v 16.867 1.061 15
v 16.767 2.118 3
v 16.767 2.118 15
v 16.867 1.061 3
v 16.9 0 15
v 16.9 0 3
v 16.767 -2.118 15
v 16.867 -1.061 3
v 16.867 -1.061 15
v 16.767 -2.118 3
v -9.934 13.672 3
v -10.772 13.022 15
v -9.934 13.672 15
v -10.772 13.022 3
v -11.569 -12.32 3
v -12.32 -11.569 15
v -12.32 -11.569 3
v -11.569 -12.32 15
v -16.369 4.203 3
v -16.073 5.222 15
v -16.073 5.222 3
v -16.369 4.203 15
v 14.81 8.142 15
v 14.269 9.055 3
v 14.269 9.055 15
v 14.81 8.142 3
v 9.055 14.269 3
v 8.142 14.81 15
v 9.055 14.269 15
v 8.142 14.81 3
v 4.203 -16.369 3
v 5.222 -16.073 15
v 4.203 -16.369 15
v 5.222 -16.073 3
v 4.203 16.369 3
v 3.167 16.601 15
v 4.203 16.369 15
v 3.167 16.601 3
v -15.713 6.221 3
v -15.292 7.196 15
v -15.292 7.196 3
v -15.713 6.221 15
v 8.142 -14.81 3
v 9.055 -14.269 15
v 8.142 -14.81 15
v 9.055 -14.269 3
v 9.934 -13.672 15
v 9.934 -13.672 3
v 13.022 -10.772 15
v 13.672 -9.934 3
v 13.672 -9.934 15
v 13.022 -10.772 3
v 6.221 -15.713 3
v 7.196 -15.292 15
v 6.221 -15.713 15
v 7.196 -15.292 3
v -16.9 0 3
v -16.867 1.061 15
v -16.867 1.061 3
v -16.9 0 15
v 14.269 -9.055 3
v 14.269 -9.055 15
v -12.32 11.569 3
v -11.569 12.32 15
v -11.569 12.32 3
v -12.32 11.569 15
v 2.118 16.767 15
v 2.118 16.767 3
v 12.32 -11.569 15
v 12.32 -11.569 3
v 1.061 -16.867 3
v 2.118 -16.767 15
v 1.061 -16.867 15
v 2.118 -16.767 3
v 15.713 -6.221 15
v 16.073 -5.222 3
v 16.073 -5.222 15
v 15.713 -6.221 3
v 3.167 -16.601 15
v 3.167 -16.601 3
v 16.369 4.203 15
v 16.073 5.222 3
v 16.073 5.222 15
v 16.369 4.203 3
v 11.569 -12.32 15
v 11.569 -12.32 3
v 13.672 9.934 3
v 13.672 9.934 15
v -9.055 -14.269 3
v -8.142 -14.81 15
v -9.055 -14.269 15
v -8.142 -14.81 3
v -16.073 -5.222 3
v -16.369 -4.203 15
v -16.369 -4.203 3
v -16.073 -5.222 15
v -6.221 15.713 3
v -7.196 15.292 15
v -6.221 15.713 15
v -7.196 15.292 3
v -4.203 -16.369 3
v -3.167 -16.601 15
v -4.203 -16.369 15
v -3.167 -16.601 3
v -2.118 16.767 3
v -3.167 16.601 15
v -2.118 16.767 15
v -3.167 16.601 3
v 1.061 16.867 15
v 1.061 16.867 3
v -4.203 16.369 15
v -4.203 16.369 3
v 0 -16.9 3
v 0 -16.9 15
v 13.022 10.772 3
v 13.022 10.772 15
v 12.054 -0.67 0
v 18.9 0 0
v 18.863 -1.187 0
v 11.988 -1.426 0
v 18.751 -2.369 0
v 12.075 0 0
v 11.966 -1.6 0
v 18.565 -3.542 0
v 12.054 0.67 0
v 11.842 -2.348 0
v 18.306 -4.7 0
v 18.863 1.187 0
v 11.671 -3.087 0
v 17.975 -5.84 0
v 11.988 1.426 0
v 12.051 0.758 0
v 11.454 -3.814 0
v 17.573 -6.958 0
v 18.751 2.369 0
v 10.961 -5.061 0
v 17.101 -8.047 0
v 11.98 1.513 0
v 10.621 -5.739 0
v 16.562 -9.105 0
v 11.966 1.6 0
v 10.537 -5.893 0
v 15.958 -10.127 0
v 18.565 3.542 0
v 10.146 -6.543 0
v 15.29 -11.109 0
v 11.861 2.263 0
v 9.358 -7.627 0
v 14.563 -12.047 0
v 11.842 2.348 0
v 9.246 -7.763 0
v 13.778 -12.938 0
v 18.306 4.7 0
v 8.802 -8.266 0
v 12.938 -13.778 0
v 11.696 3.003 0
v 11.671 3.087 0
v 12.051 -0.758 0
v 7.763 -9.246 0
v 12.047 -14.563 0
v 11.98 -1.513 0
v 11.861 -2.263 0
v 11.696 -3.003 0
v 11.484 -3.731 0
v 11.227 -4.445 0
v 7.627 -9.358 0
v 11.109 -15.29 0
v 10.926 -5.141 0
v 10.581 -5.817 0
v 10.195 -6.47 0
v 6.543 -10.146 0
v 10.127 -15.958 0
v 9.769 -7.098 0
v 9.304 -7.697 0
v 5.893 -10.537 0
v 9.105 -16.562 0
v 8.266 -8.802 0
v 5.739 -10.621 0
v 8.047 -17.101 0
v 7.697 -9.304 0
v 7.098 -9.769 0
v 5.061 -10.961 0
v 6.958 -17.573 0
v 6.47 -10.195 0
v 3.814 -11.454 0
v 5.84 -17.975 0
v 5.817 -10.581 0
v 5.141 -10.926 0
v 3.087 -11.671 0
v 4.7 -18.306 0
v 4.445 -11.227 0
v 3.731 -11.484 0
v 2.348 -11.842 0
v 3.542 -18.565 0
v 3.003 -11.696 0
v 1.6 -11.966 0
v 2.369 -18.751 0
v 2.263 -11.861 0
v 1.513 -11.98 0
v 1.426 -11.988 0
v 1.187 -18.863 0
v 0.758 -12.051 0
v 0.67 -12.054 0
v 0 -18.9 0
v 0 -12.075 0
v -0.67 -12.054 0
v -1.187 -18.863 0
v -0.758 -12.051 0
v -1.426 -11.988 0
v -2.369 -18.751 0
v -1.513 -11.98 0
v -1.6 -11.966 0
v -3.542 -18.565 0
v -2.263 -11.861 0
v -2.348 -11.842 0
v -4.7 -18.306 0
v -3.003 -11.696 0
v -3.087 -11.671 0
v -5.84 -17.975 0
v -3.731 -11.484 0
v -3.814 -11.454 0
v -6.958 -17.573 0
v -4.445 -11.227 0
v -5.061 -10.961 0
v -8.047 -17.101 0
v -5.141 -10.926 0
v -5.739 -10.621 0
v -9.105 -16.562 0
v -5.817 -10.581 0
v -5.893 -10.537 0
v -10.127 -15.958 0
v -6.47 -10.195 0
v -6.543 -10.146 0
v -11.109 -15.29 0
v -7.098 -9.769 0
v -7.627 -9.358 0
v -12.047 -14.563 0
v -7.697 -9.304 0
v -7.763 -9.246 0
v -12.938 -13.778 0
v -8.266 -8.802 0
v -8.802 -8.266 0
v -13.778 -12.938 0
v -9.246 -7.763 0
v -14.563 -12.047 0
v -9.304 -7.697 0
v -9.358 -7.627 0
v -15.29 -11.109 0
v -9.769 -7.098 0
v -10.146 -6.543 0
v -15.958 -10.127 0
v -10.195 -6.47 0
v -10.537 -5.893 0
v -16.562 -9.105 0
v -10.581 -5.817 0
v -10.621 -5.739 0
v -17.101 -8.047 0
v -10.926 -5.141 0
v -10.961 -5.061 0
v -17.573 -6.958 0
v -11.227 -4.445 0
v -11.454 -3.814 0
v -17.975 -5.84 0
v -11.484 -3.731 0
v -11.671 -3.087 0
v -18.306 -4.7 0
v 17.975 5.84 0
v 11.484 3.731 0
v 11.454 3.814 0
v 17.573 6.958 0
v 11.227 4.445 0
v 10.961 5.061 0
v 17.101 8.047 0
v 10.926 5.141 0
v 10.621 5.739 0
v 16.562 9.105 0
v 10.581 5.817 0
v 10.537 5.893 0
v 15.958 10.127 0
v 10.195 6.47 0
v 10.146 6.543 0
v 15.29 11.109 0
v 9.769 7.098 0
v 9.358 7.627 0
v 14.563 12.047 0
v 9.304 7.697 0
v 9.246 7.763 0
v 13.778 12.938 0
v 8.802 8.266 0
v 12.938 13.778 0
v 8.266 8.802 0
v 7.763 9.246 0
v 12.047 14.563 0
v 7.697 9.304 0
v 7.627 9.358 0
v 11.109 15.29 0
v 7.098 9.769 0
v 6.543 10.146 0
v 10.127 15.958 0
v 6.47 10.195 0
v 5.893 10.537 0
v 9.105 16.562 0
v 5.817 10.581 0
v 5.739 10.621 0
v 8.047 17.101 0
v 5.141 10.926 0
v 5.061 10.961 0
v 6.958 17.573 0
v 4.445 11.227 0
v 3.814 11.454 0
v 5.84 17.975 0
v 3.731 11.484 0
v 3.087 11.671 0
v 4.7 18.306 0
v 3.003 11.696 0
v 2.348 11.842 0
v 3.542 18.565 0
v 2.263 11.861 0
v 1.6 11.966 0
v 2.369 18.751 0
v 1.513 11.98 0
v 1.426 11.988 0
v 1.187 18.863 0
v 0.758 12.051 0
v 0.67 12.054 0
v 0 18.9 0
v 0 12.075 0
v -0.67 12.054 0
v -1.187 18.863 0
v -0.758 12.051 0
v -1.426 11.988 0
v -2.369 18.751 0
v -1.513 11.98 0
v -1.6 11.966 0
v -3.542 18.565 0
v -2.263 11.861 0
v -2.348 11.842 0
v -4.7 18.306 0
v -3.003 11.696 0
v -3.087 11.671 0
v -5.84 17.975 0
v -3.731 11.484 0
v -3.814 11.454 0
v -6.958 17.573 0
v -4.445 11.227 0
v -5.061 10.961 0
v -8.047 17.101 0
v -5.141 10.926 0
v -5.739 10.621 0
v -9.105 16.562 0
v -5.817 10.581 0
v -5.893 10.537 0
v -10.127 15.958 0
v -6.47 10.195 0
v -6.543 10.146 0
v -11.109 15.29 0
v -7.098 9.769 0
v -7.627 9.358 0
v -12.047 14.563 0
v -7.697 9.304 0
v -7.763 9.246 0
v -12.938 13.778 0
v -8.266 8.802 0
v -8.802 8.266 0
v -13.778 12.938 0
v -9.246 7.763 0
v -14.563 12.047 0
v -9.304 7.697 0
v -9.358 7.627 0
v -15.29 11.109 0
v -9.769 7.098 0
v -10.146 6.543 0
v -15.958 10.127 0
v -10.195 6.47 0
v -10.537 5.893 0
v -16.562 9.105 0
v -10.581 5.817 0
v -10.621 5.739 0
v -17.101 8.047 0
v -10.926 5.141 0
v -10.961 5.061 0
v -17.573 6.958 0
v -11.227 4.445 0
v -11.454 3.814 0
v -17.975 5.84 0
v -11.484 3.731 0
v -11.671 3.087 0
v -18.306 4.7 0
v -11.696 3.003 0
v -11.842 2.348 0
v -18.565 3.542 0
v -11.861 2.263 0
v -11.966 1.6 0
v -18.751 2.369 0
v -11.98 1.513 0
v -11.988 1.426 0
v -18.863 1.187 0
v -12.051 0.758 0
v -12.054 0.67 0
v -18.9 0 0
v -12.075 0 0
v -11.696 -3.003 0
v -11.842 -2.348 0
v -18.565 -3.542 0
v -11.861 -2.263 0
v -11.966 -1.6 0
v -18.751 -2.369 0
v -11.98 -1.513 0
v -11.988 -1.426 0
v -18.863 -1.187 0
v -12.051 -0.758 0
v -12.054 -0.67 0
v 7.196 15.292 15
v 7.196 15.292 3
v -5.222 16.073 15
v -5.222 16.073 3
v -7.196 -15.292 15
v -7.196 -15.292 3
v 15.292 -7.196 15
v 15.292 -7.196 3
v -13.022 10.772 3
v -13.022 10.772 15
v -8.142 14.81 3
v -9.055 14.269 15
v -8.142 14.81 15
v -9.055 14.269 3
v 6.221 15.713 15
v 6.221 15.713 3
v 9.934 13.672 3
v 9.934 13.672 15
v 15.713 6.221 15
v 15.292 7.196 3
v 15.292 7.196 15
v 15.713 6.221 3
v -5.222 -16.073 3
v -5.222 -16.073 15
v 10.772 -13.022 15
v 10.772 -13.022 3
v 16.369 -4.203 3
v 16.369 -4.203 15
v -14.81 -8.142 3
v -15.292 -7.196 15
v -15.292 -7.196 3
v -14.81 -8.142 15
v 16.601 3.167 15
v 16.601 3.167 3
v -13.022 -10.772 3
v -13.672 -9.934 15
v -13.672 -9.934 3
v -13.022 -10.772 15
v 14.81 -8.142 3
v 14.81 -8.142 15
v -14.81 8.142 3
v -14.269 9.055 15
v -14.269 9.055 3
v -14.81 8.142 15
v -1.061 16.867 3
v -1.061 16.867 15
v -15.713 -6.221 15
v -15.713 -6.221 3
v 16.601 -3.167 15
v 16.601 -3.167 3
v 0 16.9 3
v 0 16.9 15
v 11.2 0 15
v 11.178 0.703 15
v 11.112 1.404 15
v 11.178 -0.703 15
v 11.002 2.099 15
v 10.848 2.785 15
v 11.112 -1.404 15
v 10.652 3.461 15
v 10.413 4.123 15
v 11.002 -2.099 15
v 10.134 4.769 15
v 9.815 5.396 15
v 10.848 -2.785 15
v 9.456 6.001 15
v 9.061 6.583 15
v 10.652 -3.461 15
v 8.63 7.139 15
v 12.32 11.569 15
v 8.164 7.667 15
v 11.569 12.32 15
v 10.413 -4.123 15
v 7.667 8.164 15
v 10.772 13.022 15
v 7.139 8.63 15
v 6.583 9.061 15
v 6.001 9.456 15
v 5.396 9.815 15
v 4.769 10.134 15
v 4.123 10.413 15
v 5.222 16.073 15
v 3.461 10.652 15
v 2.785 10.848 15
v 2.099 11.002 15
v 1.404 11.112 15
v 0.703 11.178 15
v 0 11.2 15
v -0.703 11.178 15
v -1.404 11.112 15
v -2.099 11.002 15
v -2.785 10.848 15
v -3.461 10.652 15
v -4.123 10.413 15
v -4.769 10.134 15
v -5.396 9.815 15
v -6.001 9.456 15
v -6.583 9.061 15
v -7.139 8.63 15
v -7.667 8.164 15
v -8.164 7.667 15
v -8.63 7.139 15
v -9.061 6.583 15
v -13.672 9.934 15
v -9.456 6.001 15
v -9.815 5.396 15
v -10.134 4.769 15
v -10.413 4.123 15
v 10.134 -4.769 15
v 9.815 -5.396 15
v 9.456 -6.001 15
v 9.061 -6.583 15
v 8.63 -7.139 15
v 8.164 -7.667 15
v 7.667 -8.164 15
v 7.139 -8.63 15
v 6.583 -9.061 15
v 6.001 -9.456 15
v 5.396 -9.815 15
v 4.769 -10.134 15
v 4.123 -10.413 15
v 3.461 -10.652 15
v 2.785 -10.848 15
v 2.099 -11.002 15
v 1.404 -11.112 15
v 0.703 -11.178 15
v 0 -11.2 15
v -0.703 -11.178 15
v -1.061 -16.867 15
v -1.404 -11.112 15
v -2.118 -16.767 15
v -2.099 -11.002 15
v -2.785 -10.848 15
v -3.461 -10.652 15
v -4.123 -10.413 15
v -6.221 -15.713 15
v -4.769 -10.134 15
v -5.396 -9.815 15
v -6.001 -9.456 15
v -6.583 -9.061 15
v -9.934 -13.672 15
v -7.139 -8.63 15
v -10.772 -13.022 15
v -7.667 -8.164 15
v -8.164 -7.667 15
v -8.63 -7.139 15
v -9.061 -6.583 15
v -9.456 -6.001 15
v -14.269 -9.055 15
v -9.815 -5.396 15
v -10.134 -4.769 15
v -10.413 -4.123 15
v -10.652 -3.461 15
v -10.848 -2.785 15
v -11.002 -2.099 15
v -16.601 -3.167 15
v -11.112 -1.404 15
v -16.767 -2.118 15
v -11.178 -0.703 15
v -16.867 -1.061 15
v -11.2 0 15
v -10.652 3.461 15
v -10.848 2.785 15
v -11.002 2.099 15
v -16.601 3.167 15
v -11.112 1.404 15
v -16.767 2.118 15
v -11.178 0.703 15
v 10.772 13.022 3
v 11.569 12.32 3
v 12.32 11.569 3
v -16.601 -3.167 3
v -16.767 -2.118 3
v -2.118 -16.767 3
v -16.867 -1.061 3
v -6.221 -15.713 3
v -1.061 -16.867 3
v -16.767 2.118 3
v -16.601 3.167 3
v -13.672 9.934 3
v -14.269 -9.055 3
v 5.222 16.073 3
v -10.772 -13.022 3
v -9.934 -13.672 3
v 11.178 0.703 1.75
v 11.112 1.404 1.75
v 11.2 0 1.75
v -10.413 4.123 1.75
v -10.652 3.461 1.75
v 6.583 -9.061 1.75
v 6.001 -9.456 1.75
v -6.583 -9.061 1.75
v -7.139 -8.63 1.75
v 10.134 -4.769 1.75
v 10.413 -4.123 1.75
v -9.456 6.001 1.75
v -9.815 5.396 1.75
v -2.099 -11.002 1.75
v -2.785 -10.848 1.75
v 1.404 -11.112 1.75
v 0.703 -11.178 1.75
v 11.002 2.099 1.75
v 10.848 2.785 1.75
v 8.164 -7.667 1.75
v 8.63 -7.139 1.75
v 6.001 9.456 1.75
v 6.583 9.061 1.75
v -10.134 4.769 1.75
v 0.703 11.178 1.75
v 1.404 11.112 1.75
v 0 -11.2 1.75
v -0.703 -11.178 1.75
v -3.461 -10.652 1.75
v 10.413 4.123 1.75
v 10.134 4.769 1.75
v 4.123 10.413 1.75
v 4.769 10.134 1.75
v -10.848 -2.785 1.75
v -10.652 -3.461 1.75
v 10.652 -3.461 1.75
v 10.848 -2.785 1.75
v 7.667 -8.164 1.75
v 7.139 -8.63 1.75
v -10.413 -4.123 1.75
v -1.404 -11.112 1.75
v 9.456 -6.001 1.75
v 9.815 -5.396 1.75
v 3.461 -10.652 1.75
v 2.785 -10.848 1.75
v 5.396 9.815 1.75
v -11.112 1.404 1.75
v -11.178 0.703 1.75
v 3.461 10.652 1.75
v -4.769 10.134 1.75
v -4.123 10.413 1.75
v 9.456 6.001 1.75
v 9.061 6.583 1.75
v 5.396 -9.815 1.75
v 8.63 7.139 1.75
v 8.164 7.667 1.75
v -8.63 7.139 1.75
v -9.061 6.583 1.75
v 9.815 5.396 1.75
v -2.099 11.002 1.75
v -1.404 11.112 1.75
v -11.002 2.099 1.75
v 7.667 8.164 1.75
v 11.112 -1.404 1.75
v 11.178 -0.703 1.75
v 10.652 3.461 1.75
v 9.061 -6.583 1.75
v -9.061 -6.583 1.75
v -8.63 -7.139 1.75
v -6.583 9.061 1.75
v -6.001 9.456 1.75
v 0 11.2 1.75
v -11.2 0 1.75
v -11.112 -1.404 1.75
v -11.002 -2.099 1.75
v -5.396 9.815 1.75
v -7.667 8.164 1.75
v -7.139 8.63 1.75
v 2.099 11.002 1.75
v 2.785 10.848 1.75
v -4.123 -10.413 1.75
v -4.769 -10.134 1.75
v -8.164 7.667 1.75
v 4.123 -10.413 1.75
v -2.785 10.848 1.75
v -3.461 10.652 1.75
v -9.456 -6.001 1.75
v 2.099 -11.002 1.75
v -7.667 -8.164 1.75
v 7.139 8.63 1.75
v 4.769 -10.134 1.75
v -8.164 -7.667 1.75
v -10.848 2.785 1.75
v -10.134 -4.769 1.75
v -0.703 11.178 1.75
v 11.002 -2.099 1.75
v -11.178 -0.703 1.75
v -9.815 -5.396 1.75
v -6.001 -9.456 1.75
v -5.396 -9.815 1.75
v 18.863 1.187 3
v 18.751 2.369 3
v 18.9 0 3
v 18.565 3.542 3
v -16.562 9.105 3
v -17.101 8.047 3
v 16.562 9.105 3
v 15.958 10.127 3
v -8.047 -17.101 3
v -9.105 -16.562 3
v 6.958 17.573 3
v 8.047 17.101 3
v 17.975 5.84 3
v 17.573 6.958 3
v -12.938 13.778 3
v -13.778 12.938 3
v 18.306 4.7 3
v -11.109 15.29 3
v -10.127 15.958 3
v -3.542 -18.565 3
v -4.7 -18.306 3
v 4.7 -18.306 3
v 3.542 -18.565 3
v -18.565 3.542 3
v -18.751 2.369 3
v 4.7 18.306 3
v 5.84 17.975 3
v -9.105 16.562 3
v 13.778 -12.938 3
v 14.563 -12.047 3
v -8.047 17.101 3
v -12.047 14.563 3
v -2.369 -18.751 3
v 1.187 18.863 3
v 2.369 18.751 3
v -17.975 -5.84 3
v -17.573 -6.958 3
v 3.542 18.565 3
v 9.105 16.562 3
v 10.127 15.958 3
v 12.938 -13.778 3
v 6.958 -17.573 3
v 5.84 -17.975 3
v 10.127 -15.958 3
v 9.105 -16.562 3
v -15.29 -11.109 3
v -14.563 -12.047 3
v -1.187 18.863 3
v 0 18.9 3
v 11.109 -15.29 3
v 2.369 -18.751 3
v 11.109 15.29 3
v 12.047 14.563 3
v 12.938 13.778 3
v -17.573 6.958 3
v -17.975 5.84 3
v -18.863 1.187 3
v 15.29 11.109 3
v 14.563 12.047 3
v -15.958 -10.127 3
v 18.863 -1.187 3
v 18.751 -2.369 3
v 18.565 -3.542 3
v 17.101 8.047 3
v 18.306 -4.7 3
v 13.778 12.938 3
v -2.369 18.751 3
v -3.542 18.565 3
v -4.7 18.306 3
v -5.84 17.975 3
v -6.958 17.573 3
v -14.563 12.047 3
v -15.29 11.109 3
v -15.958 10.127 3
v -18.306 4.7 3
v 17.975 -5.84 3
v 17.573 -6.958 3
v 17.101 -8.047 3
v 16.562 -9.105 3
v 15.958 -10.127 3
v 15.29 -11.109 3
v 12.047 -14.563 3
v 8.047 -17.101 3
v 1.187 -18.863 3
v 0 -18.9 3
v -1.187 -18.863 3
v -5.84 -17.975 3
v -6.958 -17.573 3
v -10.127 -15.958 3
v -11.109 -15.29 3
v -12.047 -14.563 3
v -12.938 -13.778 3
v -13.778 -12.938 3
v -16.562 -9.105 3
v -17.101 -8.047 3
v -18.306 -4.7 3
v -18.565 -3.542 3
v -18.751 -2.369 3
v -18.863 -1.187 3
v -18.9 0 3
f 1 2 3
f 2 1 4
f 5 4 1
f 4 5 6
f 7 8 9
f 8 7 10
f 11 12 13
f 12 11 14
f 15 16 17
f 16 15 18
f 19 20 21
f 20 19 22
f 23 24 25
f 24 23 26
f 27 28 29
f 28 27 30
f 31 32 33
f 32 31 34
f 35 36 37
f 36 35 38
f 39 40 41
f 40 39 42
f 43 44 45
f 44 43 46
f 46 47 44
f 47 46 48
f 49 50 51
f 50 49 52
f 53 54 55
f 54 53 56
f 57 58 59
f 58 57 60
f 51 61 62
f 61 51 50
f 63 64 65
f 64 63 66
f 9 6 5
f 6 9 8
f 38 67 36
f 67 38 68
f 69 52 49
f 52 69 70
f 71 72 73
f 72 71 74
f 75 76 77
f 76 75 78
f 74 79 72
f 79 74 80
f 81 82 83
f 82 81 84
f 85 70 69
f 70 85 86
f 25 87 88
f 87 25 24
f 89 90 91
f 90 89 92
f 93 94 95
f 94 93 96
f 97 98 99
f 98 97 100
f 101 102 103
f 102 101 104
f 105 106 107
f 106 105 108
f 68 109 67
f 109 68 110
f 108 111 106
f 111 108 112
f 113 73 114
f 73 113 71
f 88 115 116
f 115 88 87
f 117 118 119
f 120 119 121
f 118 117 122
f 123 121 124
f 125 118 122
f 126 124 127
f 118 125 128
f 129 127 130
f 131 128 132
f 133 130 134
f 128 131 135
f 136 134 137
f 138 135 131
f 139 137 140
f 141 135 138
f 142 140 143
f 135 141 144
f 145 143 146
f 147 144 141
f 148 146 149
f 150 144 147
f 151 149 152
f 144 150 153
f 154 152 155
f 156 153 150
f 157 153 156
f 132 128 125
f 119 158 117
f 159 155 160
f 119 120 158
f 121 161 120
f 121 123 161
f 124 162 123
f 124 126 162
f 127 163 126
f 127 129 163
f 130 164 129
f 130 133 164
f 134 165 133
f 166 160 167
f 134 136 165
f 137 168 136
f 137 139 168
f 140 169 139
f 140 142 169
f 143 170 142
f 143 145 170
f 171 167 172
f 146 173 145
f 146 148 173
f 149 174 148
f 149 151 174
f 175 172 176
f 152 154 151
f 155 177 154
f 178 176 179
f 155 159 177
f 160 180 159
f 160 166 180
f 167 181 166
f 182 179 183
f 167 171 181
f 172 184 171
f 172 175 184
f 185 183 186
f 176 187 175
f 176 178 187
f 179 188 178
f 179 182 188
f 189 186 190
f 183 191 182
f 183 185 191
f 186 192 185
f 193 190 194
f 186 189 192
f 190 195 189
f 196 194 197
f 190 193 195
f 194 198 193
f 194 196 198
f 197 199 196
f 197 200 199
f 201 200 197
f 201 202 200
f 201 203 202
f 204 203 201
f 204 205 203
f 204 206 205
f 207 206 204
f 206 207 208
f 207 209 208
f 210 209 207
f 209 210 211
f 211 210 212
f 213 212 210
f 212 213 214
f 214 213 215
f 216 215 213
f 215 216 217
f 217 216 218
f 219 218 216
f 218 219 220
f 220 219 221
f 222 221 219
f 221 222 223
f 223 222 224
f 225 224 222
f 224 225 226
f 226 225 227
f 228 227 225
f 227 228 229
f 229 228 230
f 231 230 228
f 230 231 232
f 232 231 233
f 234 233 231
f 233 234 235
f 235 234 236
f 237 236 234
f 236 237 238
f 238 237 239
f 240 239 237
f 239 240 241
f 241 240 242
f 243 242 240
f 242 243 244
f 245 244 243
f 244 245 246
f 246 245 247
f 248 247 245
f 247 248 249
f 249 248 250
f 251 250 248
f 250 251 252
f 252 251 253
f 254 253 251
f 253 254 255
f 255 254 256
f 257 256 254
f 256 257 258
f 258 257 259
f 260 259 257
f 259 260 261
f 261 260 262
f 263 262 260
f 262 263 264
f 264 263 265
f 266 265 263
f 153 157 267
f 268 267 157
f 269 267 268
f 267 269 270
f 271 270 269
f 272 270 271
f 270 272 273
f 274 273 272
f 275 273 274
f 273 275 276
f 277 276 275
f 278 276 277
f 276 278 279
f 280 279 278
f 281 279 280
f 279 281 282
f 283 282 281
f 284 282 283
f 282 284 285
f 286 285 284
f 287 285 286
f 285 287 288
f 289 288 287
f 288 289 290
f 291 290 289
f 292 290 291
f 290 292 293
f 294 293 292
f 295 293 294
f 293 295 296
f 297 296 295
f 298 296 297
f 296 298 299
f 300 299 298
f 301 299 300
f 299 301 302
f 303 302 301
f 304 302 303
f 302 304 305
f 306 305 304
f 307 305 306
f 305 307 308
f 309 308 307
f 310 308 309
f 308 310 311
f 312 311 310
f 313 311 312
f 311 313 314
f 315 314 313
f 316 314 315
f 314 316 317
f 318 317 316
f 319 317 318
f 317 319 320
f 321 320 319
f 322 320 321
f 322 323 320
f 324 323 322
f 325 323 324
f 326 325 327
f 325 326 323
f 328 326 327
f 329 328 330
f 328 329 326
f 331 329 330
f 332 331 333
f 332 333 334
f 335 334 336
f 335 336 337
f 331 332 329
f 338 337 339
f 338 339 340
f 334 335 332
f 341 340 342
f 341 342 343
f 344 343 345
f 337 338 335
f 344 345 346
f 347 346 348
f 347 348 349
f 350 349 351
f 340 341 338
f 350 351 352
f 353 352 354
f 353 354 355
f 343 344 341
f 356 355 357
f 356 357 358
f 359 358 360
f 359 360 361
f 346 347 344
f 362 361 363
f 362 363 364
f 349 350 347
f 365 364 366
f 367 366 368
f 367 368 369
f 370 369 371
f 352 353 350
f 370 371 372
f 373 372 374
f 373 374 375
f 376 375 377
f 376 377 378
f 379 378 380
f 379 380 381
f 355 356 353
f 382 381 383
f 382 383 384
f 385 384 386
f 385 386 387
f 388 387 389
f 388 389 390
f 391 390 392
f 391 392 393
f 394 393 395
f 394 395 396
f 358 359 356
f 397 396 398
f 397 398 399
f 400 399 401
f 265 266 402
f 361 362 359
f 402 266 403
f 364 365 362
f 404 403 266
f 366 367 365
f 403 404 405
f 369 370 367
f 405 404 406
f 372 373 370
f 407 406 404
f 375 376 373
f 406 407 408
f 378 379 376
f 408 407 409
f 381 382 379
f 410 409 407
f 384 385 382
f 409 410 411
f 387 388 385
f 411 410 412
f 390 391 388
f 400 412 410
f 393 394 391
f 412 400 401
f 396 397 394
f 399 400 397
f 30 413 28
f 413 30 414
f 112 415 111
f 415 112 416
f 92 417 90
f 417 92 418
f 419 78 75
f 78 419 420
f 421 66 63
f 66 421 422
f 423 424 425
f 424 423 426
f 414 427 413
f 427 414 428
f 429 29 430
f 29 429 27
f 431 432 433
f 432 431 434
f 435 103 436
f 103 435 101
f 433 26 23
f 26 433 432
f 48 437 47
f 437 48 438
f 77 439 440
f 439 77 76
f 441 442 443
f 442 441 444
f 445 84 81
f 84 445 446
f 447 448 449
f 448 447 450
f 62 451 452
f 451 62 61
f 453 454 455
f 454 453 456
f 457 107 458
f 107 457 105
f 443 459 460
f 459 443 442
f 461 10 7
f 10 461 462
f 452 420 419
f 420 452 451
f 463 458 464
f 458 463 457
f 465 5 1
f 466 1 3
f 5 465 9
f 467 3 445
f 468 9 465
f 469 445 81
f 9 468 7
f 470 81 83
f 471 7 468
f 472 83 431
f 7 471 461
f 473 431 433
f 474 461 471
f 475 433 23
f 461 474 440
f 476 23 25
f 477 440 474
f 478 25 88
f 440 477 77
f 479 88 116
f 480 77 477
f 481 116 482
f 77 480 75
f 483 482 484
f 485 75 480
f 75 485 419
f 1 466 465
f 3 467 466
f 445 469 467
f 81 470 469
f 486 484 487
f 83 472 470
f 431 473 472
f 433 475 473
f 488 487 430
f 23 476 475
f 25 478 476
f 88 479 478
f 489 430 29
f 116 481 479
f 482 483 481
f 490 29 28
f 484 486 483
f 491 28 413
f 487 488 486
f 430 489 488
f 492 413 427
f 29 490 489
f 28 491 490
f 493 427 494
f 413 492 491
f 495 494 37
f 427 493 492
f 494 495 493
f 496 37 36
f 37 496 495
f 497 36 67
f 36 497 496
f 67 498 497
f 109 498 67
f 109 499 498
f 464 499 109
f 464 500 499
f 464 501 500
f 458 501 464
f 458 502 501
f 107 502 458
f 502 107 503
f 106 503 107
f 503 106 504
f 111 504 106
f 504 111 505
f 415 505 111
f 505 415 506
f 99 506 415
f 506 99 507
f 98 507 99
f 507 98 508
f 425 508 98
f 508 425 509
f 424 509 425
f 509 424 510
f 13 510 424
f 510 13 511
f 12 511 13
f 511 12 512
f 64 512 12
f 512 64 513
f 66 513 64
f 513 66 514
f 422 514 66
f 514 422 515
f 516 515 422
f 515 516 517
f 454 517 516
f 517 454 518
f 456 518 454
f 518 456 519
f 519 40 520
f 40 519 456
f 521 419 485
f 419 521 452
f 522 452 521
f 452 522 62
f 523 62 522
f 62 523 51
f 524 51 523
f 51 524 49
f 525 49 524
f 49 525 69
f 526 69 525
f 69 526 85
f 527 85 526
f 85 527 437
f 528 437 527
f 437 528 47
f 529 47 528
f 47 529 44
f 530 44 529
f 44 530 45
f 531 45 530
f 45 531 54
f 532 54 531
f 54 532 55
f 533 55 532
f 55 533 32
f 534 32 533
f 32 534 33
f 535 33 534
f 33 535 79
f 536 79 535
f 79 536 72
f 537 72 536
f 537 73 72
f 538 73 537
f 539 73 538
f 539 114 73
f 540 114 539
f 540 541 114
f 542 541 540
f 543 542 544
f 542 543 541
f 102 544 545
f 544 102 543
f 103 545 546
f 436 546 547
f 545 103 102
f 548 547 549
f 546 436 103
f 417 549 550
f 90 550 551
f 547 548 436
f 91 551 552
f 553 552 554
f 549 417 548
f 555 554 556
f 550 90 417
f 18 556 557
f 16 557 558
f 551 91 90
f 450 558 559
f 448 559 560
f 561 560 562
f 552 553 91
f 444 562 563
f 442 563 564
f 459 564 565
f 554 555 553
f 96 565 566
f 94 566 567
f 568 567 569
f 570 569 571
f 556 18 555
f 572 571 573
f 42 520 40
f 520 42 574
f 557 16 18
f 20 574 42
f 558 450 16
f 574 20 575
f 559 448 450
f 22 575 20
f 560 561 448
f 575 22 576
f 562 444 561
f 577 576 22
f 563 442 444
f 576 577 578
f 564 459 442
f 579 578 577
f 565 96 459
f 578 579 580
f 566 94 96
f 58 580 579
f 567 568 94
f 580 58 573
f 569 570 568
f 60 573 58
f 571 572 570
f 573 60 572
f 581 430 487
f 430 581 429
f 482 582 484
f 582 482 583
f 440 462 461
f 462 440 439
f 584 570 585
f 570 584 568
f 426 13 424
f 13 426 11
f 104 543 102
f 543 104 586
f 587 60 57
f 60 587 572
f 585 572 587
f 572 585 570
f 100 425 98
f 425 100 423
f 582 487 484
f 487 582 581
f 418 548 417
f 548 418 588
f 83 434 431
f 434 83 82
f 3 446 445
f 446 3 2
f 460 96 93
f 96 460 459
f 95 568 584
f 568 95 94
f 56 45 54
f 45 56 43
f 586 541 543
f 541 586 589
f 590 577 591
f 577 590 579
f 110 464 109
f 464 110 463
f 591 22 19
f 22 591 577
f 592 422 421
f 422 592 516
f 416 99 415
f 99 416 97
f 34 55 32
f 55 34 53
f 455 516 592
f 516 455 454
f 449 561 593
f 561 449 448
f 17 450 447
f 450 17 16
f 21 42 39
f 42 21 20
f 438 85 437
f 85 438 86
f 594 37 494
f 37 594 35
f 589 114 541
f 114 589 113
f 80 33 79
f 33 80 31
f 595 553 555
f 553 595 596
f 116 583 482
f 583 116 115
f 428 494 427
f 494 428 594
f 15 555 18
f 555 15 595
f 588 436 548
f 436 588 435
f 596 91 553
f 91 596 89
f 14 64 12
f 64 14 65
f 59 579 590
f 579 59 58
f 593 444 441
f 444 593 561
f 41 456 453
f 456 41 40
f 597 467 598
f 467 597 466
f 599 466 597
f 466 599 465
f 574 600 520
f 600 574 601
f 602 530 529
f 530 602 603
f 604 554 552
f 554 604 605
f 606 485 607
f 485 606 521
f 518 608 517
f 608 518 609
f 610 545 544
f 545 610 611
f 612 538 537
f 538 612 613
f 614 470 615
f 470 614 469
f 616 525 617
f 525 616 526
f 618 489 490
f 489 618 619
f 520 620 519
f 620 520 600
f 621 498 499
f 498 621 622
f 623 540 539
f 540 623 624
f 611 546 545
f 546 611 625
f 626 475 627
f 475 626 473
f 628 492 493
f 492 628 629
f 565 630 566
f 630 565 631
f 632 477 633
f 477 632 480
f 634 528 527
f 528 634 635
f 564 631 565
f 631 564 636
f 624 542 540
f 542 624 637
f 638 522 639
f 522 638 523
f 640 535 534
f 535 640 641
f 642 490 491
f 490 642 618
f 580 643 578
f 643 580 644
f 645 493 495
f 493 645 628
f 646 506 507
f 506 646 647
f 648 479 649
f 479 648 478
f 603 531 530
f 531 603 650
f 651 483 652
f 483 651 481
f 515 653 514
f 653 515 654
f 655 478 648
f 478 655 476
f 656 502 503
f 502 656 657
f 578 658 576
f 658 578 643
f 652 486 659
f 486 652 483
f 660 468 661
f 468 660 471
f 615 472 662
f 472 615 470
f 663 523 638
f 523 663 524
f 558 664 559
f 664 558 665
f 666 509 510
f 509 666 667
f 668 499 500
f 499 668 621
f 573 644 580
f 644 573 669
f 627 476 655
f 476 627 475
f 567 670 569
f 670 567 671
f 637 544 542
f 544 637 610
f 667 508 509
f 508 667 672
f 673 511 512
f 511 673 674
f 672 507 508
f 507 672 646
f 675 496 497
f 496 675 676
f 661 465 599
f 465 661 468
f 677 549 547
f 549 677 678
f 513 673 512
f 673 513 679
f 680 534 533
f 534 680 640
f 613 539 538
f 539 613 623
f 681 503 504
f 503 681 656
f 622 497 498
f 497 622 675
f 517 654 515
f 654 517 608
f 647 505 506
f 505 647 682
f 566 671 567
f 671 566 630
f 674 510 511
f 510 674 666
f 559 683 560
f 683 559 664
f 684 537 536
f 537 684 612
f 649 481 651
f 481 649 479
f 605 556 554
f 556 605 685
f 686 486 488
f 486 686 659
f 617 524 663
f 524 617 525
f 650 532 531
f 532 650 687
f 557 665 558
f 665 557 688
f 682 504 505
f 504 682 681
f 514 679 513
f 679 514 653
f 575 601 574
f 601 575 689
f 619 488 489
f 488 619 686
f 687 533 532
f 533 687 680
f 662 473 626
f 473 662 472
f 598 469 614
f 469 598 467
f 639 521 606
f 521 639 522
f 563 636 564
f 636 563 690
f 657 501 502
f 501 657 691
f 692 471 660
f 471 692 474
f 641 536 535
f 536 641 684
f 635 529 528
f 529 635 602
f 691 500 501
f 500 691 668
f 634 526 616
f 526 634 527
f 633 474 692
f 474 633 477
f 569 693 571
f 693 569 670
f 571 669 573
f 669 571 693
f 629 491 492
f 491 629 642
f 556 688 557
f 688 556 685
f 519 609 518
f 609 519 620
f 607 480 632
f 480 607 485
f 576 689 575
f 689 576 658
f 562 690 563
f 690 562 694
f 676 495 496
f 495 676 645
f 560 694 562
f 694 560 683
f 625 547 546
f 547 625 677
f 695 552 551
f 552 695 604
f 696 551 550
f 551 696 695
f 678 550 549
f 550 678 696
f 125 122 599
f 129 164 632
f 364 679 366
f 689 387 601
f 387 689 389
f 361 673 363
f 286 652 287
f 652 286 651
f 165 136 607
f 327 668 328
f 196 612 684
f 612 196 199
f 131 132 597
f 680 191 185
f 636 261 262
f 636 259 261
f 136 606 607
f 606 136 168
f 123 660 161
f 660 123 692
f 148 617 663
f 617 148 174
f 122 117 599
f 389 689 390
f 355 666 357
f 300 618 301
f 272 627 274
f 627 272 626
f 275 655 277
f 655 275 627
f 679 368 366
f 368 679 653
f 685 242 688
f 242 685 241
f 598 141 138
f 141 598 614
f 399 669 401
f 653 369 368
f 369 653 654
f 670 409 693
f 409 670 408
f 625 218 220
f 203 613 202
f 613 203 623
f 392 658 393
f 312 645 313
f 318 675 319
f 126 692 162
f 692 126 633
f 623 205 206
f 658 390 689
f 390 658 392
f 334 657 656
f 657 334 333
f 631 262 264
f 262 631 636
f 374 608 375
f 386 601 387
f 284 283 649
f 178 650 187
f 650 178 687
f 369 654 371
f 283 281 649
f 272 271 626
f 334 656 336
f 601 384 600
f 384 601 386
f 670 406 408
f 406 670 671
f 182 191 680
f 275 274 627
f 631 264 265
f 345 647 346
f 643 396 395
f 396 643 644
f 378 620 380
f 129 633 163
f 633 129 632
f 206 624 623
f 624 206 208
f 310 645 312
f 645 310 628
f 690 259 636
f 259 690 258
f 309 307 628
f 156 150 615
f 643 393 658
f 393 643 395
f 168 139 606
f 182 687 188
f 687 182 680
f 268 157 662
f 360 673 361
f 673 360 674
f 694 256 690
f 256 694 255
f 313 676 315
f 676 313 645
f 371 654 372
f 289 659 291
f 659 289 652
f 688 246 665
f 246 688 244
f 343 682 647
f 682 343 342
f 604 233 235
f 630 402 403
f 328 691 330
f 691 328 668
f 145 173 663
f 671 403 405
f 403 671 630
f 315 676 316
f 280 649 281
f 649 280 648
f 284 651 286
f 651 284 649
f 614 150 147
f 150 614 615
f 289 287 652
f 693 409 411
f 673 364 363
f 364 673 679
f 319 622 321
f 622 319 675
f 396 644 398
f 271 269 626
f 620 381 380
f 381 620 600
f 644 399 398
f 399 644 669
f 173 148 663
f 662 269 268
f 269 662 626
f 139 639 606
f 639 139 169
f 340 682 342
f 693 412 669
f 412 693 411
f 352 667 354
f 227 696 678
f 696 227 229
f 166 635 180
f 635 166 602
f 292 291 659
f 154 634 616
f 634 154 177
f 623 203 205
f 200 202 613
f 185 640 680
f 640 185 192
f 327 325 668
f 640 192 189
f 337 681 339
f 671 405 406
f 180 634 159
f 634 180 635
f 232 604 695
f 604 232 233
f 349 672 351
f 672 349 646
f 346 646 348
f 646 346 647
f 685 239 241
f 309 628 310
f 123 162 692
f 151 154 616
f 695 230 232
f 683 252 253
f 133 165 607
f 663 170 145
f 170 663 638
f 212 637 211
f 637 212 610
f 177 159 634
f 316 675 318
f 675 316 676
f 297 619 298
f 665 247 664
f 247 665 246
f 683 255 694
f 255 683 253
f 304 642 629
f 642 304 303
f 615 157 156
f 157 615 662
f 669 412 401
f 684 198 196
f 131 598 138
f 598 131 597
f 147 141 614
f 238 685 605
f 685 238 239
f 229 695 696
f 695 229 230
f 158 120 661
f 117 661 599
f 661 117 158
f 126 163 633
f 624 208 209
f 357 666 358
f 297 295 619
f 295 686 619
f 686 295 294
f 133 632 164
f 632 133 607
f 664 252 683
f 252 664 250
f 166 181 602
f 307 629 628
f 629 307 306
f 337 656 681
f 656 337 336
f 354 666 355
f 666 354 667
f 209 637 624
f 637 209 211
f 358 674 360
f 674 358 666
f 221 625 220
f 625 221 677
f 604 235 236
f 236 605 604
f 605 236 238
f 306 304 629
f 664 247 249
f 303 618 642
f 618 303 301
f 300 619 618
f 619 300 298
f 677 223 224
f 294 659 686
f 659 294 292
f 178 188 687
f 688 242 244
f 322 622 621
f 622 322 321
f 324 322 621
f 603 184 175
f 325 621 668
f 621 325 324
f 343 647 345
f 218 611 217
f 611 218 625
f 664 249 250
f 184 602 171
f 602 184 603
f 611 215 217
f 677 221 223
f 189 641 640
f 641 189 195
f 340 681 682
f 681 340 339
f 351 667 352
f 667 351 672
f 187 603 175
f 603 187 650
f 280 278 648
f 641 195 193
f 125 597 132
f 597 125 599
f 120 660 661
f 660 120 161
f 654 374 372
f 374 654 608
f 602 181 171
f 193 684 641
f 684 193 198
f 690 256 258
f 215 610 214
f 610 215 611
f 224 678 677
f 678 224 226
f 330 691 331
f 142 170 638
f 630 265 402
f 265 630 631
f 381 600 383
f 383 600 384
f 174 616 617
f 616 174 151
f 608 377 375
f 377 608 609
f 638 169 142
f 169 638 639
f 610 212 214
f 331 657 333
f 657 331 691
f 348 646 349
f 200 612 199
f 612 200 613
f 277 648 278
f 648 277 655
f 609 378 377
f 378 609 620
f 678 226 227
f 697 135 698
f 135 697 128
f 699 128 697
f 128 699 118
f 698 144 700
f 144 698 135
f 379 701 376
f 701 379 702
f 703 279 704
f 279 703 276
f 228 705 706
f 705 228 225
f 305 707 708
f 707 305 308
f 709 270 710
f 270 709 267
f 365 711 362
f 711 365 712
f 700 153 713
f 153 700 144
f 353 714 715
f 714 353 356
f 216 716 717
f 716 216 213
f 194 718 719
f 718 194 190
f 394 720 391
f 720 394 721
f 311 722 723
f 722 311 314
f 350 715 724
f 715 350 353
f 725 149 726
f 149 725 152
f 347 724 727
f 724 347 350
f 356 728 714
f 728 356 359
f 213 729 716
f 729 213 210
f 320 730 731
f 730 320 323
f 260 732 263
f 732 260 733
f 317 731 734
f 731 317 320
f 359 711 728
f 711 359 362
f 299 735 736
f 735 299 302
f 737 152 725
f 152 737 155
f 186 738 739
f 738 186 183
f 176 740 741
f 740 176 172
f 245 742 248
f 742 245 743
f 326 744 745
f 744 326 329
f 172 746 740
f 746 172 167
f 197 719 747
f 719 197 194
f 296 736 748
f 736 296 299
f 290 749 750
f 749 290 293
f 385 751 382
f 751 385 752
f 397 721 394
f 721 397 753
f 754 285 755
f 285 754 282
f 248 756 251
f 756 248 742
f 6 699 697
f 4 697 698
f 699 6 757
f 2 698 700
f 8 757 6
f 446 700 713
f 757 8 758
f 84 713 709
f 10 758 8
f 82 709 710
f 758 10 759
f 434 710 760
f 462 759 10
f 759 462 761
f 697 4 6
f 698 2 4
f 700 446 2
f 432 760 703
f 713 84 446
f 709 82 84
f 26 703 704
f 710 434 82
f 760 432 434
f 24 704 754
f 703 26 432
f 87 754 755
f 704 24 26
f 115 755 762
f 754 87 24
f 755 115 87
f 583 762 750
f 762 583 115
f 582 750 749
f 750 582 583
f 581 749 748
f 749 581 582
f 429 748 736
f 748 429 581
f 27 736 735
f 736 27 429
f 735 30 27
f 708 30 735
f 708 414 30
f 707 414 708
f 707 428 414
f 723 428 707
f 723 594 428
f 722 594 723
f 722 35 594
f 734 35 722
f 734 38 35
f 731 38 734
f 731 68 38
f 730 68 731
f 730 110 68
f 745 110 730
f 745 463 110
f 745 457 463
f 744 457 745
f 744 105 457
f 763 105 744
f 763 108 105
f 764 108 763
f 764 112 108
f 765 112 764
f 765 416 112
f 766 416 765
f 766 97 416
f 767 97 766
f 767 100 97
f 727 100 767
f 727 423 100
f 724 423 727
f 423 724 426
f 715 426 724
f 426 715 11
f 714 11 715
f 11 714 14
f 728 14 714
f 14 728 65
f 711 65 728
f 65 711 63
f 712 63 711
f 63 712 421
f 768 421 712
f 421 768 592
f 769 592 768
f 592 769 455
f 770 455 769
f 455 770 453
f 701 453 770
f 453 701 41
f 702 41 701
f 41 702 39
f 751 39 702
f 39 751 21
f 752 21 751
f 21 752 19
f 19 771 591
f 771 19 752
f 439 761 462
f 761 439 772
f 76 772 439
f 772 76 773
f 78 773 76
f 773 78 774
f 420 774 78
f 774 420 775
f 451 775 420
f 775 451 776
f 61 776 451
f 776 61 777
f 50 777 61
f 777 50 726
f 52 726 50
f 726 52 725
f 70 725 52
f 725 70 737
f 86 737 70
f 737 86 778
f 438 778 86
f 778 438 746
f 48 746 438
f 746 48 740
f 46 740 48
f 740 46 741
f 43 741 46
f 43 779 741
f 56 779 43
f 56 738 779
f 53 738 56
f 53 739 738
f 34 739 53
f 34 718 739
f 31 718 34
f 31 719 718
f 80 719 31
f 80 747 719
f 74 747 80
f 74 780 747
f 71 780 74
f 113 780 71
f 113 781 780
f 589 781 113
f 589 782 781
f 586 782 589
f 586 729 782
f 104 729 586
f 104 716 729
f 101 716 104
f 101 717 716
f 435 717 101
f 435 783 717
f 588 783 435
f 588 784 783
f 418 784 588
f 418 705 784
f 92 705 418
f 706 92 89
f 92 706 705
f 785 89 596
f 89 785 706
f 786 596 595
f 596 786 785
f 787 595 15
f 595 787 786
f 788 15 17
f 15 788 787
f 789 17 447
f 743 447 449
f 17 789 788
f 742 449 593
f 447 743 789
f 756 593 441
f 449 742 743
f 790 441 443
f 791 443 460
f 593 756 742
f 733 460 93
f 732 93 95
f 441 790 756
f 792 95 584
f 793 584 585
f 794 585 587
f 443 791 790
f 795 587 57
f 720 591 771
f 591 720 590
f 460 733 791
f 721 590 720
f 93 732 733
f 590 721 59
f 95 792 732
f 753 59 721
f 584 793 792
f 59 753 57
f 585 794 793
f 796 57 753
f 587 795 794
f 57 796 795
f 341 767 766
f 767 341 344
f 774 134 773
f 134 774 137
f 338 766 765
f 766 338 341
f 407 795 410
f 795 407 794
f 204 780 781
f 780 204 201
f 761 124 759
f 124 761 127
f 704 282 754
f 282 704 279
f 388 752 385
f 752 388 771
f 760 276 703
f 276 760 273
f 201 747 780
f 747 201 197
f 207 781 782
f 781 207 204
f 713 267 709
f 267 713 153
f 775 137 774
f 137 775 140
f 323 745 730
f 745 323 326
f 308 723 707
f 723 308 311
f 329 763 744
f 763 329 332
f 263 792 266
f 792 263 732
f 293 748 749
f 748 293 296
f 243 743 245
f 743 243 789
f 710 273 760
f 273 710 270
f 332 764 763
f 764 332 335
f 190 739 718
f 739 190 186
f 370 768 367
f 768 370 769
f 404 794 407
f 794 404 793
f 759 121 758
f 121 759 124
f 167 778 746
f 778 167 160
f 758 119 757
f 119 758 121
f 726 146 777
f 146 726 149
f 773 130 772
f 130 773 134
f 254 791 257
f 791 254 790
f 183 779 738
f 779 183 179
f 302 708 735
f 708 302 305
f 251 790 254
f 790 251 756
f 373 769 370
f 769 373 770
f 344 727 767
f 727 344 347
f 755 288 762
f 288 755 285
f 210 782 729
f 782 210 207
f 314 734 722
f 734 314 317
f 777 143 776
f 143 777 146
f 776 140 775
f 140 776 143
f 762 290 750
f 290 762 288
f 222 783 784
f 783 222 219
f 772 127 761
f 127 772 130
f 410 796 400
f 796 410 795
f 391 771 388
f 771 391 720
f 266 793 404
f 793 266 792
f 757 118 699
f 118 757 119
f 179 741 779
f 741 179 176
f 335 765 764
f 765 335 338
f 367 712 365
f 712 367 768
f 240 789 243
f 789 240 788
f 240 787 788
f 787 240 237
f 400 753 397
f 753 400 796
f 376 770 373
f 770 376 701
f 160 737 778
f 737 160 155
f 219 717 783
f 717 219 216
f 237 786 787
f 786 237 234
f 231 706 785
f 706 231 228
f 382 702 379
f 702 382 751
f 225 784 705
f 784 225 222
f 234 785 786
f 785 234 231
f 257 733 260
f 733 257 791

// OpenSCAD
//fitting to pipe adapter


$fn=100;

LPR=16.90;  //enter larger pvc pipe radii here (for standard 1" PVC, LPR=16.90)
SPR=11.2;   //enter smaller pvc pipe radii here (for standard 3/4" CPVC, SPR=11.2)

difference () {
    cylinder(15,LPR,LPR);
    translate([0,0,-1]) cylinder(25,SPR,SPR);
    translate ([0,0,-0.25])cylinder (2,SPR+1,SPR);
    }

difference () {
    cylinder(3,LPR+2,LPR+2);
    translate([0,0,-1])cylinder(25,SPR,SPR);
    translate ([0,0,-0.25])cylinder (2,SPR+1,SPR);
    }
